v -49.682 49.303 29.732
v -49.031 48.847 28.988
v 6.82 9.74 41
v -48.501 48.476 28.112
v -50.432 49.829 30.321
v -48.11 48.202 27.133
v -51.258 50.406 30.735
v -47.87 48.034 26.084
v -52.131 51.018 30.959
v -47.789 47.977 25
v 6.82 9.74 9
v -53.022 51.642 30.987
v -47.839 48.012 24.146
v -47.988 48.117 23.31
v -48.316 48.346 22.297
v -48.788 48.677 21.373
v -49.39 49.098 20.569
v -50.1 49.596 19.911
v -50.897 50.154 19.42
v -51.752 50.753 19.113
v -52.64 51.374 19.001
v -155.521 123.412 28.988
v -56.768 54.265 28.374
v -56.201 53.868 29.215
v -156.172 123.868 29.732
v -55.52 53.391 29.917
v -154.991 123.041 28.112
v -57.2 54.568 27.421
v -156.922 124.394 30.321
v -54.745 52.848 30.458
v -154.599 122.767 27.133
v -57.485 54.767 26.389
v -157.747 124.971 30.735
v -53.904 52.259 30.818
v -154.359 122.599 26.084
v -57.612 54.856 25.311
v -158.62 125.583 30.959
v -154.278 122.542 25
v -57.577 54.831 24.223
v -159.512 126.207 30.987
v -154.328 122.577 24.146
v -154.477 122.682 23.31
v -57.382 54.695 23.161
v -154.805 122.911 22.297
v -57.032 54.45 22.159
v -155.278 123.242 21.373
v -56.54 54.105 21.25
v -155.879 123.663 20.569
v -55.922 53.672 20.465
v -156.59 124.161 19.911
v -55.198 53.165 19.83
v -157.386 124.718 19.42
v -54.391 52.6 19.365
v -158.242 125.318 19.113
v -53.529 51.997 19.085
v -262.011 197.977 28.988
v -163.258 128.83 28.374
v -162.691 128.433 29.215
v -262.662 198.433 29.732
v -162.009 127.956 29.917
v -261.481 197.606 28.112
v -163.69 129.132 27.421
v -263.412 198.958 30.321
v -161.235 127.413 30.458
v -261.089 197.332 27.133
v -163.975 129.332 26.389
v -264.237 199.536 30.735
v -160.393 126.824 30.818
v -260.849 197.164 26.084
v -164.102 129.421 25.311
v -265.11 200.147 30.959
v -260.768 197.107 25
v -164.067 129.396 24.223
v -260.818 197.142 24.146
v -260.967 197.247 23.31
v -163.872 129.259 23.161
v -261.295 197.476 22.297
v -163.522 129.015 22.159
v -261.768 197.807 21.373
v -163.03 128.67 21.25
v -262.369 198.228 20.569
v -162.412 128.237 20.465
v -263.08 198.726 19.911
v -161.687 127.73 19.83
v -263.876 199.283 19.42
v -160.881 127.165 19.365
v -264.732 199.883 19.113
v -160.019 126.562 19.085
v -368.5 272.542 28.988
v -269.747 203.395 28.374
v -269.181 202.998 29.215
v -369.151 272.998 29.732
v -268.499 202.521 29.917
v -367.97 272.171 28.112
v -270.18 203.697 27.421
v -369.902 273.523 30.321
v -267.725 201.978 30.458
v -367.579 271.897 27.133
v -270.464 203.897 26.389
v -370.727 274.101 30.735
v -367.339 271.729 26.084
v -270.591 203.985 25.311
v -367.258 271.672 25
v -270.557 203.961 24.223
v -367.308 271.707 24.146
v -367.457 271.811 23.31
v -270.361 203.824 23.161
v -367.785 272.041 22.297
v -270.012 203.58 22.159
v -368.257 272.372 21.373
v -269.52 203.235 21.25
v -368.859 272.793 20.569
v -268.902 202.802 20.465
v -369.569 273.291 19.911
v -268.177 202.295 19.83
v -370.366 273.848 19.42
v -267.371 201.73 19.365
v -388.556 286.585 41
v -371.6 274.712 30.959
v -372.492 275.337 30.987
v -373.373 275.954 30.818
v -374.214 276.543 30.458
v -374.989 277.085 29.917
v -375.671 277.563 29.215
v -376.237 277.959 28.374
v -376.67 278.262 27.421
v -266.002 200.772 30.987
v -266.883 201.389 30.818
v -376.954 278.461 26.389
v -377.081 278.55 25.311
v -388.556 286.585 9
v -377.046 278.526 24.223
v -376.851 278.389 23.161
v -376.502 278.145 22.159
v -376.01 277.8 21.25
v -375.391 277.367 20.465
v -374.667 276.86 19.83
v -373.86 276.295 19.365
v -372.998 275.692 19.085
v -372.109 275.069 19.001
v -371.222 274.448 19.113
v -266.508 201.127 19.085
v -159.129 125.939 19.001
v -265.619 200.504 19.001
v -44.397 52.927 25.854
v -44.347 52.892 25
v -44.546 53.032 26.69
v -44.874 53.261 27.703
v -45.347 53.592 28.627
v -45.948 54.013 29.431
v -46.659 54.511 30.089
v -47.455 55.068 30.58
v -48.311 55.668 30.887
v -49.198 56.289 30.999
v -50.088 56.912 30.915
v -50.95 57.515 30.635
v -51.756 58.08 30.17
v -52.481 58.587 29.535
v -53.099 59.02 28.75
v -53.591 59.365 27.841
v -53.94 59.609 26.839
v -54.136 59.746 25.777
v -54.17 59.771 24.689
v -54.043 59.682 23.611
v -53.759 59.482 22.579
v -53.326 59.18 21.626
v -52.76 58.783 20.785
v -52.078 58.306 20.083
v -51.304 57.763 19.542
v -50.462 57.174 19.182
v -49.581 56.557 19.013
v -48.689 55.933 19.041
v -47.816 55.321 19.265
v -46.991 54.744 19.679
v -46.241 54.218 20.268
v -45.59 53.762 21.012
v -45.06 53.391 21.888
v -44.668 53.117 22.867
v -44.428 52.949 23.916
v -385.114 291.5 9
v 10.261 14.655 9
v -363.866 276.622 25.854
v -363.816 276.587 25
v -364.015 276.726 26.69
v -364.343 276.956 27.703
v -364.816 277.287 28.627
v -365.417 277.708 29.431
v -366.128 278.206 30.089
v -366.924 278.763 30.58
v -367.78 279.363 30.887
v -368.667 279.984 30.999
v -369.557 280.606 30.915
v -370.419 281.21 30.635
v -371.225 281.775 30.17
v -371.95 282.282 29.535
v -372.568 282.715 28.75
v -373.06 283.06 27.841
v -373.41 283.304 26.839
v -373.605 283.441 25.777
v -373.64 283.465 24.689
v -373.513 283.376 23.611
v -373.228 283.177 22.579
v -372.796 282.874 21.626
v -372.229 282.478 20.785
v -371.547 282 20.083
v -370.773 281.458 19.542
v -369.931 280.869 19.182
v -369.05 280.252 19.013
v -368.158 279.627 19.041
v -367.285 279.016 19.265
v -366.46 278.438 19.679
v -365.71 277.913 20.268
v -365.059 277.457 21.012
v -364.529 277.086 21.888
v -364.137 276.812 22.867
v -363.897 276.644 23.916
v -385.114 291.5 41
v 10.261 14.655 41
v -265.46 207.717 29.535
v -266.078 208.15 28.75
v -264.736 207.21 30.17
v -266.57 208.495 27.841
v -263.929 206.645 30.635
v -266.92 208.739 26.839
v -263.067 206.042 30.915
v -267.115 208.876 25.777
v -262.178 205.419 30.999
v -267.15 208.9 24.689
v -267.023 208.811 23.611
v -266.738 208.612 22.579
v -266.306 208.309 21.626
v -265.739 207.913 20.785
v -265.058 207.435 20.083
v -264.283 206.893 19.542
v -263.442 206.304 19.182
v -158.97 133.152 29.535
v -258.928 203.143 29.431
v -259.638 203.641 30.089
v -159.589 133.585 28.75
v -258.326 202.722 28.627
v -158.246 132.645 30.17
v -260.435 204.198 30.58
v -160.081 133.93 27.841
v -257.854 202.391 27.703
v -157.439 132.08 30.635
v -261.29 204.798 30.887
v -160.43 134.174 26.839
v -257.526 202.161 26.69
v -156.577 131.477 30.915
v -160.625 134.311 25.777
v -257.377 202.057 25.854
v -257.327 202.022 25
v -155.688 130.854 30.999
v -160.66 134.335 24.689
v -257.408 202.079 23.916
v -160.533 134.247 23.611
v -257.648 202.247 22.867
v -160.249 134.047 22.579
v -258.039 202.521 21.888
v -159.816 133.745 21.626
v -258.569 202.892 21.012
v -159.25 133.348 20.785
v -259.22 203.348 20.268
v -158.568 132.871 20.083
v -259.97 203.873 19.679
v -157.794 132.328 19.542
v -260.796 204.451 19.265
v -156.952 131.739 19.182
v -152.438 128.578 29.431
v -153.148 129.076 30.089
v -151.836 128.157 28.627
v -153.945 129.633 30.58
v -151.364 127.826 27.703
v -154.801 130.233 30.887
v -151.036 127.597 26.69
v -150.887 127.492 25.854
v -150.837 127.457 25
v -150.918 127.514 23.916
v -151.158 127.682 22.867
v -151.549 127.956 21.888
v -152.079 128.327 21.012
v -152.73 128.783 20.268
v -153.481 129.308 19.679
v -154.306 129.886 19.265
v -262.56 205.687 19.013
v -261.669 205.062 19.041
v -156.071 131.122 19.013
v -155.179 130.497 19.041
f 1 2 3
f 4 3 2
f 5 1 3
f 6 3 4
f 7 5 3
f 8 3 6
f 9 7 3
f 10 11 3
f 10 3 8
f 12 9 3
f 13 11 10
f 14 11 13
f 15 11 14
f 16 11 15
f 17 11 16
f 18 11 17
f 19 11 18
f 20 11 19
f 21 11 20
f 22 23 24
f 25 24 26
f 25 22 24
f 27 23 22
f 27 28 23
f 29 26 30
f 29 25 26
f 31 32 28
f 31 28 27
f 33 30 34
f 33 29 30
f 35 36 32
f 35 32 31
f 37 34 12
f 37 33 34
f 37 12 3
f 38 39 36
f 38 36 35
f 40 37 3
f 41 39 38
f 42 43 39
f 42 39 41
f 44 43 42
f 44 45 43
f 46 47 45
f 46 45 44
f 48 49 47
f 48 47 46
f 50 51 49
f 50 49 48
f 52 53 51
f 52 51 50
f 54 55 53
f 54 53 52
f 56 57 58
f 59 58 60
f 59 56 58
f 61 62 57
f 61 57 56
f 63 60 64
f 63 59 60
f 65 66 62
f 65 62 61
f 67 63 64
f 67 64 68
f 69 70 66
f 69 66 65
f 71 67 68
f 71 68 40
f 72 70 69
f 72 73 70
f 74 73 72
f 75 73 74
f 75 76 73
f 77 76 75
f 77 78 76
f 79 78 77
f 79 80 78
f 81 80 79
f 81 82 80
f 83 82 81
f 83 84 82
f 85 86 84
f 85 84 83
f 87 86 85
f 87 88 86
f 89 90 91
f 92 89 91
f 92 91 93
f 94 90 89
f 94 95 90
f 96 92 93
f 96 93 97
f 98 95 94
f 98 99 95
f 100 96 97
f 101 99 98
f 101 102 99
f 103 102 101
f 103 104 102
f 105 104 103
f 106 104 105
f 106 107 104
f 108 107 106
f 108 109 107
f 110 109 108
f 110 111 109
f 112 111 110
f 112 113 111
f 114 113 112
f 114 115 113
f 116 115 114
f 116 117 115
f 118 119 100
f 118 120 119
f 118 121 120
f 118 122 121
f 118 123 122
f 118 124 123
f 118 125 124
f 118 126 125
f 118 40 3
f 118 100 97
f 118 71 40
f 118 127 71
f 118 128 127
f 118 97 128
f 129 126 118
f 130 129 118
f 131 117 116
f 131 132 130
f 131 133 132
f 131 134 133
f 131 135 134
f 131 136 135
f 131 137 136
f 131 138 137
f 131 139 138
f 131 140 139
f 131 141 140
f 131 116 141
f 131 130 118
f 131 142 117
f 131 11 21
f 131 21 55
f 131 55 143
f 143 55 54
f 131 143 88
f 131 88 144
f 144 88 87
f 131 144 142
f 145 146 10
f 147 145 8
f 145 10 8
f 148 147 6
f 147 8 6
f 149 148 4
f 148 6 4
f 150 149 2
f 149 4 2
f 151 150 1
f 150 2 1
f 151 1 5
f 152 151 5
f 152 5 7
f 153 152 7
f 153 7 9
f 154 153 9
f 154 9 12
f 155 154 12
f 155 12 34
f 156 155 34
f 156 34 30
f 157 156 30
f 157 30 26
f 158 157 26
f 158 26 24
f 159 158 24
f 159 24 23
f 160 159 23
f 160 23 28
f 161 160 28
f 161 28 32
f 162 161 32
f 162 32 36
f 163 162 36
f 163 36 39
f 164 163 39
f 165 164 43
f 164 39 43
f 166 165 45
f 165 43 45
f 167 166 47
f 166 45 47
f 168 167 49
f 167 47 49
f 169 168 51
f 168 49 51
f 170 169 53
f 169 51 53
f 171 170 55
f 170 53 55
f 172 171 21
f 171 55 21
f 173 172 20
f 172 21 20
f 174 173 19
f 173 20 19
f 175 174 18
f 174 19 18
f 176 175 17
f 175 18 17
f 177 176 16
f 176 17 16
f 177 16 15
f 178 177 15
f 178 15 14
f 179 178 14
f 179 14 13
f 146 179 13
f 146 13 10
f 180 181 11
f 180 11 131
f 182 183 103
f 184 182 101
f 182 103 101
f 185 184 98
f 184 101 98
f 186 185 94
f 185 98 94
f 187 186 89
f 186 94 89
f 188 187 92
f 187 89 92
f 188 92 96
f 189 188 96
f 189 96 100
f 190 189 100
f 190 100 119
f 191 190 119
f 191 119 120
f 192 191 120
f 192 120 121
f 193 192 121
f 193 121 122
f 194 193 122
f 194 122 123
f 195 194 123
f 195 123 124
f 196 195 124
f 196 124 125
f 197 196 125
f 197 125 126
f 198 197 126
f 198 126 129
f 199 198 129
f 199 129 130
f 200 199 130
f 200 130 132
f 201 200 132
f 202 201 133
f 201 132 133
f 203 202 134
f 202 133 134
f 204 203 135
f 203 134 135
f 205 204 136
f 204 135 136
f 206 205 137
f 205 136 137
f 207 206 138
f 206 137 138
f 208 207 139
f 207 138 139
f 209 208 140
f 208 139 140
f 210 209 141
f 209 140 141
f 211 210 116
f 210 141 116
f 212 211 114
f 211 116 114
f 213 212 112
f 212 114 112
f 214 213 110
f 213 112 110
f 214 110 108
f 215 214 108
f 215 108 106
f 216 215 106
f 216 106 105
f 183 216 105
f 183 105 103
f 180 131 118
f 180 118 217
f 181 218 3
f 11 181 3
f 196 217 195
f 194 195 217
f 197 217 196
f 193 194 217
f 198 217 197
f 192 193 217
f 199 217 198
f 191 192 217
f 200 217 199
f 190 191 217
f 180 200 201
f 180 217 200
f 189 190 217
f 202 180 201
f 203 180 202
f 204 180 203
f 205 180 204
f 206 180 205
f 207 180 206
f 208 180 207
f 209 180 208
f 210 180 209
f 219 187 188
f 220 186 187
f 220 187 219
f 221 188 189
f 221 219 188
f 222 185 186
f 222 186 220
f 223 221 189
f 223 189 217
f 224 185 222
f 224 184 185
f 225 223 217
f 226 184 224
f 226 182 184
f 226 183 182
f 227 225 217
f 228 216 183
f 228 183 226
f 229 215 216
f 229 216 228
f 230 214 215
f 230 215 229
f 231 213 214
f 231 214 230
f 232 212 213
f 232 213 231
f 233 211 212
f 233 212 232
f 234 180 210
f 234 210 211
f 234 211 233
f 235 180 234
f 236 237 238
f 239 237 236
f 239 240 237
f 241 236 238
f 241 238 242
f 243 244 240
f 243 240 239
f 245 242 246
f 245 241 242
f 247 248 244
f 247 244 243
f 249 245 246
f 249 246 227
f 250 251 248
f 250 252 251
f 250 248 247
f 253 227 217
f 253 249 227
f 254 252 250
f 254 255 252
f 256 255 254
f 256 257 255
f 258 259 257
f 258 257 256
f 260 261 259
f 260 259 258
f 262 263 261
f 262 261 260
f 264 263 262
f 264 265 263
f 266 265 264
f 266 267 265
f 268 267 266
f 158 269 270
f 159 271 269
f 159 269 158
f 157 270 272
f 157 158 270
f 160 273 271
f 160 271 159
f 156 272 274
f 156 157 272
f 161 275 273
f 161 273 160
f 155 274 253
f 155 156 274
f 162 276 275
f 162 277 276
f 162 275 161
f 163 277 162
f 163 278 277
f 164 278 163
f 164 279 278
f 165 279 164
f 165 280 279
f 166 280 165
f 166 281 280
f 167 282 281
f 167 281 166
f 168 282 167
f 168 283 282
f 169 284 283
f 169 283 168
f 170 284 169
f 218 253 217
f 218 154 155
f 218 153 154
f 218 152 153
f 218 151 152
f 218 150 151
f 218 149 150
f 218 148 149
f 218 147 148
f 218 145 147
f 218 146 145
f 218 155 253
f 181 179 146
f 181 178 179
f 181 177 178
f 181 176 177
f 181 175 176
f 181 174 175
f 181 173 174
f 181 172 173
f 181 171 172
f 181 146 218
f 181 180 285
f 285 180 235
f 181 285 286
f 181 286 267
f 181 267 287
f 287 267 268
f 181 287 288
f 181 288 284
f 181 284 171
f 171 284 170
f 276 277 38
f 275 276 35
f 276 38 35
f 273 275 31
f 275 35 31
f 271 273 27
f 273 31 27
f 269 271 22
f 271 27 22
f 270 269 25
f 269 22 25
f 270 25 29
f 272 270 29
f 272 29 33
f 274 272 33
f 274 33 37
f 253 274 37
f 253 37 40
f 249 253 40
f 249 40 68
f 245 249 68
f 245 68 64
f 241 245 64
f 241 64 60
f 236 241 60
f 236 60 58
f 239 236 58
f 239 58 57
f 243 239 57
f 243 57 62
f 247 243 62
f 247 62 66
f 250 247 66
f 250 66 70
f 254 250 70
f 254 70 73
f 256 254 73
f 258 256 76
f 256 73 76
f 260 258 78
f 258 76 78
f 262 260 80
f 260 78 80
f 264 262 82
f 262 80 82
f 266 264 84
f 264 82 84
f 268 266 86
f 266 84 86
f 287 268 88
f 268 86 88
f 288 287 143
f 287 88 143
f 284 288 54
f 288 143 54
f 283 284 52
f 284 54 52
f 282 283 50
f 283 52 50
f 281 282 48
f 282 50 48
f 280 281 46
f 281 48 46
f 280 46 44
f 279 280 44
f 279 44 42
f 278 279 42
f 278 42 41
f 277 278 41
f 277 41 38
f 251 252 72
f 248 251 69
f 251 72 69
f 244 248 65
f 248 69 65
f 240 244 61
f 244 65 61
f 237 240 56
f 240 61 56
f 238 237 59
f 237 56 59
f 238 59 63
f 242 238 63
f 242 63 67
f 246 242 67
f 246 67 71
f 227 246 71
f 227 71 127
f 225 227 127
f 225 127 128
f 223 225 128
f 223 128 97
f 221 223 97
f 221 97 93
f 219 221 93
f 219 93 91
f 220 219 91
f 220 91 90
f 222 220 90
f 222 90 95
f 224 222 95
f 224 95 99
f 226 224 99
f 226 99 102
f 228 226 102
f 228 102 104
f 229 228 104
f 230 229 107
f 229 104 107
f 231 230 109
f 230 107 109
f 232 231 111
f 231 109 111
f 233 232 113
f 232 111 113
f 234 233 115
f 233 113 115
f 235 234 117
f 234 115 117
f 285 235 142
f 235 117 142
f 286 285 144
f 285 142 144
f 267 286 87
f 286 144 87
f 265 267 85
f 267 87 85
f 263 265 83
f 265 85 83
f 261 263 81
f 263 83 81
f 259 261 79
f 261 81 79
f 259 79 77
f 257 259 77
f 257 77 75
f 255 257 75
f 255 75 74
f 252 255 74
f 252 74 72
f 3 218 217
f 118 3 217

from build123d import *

# Parameters (mm, degrees)
PAD006_DEPTH           = 32
SKETCH014_R            = 6
POCKET004_DEPTH        = 232.77922
LINEARPATTERN002_COUNT = 4
LINEARPATTERN002_PITCH = 130


with BuildPart() as part:
    # Sketch013 → Pad006 (new body)
    with BuildSketch(Plane.XY):
        Polygon((-385.11428, 291.5), (10.26148, 14.654912), (6.820021, 9.74), (-388.555739, 286.585088), align=None)
    extrude(amount=PAD006_DEPTH)

    # Sketch014 (on Face3 of Pad006) → Pocket004 (cut, through all)
    with BuildSketch(Plane(origin=(6.820021, 9.74, 0), x_dir=(0.819152, -0.573576, 0), z_dir=(-0.573576, -0.819152, 0))):
        with Locations((-462.664681, 16)):
            Circle(SKETCH014_R)
    pocket004 = extrude(amount=-POCKET004_DEPTH, mode=Mode.SUBTRACT)

    # LinearPattern002: Pocket004 ×4
    with Locations(*[Vector(0.819152, -0.573576, 0) * (i * LINEARPATTERN002_PITCH) for i in range(1, LINEARPATTERN002_COUNT)]):
        add(pocket004, mode=Mode.SUBTRACT)


with BuildPart() as part_1:
    # Body005 placement: moved
    add(part.part.moved(Location((0, 0, 9))))


solid = part_1.part
